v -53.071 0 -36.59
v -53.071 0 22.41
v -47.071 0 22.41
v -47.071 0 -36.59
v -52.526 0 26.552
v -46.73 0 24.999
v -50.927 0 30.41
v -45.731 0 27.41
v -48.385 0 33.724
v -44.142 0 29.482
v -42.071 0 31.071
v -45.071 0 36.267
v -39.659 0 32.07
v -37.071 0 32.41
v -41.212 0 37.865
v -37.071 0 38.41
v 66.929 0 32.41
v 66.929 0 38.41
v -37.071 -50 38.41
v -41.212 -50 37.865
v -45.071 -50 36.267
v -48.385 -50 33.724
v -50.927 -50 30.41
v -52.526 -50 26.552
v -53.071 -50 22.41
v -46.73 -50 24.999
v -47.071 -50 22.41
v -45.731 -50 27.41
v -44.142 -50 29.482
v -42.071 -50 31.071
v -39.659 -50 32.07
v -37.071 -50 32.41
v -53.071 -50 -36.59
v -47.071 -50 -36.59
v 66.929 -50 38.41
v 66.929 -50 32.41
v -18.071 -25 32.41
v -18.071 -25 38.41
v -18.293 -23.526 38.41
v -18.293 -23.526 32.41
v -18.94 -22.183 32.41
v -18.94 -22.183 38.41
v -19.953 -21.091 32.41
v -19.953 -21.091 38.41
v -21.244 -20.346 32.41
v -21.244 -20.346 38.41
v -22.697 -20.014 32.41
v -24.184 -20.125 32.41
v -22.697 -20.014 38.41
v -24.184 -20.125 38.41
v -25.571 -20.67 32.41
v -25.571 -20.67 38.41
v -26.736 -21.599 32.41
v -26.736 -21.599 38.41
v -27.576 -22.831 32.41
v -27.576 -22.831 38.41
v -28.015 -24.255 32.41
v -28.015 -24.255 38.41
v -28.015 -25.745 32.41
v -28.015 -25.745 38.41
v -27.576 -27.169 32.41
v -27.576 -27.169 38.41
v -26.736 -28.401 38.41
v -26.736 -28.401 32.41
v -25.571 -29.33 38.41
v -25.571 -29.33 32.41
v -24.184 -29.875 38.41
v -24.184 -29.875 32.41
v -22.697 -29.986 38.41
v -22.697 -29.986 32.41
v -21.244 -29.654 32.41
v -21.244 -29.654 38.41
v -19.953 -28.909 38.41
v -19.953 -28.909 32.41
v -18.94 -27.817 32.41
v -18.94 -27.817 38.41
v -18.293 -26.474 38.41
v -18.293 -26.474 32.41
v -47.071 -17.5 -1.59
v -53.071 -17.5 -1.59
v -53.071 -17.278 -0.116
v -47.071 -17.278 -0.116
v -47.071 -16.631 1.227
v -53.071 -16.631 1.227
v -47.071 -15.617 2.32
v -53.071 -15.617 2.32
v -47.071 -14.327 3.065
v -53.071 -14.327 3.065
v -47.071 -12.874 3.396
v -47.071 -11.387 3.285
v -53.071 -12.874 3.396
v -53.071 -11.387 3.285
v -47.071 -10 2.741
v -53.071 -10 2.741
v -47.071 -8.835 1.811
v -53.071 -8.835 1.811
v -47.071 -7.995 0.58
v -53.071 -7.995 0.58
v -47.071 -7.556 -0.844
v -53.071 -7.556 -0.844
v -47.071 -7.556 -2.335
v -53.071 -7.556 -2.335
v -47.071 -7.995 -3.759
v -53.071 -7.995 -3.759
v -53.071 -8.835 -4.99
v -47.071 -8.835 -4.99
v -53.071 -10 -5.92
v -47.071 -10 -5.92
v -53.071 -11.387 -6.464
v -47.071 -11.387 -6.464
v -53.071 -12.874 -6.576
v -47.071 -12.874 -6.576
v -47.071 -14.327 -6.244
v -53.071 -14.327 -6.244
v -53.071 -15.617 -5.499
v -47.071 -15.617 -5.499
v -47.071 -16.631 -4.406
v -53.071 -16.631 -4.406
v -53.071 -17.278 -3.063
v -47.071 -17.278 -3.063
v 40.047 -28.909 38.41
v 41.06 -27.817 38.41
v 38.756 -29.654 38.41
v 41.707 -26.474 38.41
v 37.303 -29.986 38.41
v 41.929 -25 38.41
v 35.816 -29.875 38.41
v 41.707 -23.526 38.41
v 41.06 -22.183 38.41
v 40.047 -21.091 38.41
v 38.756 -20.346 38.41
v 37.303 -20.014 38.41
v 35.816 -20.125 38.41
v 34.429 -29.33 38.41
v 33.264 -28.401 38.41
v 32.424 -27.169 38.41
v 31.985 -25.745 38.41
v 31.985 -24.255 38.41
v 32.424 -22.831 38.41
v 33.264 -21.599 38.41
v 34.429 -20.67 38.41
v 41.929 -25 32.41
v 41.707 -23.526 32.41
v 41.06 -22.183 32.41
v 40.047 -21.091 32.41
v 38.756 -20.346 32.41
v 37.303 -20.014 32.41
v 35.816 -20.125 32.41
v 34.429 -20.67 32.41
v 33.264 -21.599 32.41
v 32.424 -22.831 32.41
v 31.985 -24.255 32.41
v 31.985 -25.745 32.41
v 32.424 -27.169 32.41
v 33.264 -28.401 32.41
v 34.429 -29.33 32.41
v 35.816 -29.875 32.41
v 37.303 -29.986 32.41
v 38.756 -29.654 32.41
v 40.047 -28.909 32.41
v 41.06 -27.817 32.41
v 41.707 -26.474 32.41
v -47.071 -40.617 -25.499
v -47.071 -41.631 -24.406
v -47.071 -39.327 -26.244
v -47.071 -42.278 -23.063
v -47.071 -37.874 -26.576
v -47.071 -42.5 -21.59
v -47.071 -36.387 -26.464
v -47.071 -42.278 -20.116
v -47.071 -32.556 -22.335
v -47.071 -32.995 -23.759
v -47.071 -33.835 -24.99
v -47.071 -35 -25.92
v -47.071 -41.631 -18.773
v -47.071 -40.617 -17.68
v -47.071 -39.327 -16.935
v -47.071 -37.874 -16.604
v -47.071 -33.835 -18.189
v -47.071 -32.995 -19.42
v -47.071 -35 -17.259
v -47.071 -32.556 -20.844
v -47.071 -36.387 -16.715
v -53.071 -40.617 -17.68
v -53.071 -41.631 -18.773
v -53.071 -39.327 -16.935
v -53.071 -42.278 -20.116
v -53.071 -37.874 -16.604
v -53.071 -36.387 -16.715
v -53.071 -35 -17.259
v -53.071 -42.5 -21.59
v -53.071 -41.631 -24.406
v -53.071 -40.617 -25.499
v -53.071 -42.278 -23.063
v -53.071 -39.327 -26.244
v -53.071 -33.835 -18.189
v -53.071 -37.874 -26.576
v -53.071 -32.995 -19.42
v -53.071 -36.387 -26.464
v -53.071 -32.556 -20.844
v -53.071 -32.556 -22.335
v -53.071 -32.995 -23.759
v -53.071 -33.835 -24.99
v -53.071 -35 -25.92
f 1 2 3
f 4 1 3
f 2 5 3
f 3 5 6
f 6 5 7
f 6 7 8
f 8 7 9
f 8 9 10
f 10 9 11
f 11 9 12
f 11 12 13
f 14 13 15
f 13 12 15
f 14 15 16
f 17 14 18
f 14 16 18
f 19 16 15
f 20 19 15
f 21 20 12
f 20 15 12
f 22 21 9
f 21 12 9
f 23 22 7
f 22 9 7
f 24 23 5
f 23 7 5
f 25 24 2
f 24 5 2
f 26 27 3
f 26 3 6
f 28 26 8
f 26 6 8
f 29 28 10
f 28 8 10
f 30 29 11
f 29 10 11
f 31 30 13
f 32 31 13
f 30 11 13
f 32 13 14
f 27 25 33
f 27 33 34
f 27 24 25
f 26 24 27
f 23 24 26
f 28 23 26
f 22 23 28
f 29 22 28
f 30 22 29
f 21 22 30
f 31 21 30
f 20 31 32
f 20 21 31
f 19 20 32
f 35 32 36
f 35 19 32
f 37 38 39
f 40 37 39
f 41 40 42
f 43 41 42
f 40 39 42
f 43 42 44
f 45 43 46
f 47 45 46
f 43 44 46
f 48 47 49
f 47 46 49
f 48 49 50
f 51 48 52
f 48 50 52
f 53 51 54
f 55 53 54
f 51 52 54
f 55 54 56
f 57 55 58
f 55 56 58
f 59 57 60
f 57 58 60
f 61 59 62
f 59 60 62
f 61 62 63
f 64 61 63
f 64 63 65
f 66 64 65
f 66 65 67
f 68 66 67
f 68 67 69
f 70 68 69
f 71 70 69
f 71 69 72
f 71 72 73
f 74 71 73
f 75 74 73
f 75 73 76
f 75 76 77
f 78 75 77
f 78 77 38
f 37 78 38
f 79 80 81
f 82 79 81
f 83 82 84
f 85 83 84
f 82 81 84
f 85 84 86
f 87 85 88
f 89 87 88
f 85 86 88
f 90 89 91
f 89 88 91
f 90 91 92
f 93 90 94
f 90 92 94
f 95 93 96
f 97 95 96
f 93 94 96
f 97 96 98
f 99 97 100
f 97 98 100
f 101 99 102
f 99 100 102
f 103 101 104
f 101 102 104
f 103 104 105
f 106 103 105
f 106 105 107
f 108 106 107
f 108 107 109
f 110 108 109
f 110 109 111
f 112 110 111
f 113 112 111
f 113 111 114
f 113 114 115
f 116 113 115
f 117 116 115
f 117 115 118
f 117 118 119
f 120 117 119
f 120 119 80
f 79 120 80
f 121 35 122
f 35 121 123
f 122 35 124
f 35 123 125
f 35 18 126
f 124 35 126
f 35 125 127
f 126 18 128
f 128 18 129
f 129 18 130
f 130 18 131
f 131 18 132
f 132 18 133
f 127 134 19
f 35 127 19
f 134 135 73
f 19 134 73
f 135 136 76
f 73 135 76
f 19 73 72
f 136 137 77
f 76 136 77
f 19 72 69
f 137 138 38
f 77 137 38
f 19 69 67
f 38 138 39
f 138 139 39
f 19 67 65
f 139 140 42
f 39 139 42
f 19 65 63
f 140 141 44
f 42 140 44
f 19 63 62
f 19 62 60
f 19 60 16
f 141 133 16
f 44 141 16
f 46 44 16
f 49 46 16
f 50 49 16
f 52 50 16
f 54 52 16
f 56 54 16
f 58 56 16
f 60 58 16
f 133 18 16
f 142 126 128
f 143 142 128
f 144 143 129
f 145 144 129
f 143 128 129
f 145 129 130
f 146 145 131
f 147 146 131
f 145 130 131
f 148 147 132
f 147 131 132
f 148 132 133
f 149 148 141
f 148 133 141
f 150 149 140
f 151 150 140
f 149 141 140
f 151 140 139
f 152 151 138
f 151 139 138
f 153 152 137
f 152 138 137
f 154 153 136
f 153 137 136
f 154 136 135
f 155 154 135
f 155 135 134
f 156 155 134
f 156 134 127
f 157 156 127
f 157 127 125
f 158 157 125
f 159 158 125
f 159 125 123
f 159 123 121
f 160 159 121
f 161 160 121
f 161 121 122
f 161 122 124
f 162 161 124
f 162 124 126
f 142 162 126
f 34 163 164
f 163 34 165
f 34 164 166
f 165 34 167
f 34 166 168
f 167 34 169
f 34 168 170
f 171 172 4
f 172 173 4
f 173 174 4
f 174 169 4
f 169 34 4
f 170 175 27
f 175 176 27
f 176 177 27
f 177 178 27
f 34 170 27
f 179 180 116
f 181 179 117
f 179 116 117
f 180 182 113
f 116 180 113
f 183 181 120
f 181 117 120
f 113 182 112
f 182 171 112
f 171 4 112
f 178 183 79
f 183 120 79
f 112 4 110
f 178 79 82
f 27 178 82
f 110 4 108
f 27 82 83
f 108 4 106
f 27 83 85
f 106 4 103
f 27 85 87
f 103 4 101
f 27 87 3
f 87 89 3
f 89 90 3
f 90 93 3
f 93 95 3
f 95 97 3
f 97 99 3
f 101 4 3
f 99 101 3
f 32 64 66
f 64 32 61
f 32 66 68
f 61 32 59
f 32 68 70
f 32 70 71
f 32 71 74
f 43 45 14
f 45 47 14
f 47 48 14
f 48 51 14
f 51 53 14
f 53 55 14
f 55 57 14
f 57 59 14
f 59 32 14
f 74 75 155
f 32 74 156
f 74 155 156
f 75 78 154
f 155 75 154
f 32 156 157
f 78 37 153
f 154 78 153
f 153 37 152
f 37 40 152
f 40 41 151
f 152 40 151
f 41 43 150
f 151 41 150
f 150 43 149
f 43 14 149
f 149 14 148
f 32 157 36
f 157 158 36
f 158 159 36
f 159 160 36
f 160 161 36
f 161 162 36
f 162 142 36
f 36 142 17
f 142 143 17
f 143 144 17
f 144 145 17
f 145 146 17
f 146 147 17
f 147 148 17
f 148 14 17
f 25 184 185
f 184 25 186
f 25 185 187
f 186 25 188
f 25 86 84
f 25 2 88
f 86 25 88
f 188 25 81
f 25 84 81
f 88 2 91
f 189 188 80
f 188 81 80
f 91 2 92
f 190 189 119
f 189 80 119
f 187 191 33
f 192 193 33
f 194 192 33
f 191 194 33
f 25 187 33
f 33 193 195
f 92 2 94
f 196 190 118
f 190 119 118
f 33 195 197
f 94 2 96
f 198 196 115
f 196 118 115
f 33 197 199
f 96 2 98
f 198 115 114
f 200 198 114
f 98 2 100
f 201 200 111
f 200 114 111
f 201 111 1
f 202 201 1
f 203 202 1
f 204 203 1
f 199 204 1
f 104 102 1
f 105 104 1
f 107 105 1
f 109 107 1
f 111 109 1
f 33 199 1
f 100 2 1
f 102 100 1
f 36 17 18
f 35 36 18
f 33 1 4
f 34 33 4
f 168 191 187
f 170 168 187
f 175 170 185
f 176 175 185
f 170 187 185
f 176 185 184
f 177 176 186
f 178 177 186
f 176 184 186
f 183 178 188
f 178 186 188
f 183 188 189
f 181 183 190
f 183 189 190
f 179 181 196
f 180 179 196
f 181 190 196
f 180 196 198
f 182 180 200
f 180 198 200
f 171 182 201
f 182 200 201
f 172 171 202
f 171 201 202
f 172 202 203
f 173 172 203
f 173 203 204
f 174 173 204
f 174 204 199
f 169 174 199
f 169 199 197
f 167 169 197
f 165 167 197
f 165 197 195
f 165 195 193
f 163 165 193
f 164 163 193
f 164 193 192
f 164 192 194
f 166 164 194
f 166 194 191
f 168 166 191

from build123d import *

# Parameters (mm, degrees)
F1_DEPTH = 50
F2_R     = 5
F3_DEPTH = 25
F4_R     = 5
F5_DEPTH = 25


with BuildPart() as f1:
    # F0 (on Front) → F1 (new body)
    with BuildSketch(Plane.XZ):
        with BuildLine():
            Line((-53.070944, 22.410468), (-53.070944, -36.589532))
            Line((-53.070944, -36.589532), (-47.070944, -36.589532))
            Line((-47.070944, -36.589532), (-47.070944, 22.410468))
            ThreePointArc((-47.070944, 22.410468), (-44.142012, 29.481535), (-37.070944, 32.410468))
            Line((-37.070944, 32.410468), (66.929056, 32.410468))
            Line((66.929056, 32.410468), (66.929056, 38.410468))
            Line((66.929056, 38.410468), (-37.070944, 38.410468))
            ThreePointArc((-37.070944, 38.410468), (-48.384652, 33.724176), (-53.070944, 22.410468))
        make_face()
    extrude(amount=F1_DEPTH)

    # F2 (on face) → F3 (cut)
    with BuildSketch(Plane.XY.offset(38.410468)):
        with Locations((-23.070944, -25)):
            Circle(F2_R)
        with Locations((36.929056, -25)):
            Circle(F2_R)
    extrude(amount=-F3_DEPTH, mode=Mode.SUBTRACT)

    # F4 (on face) → F5 (cut)
    with BuildSketch(Plane(origin=(-53.070944, 0, 0), x_dir=(0, -1, 0), z_dir=(-1, 0, 0))):
        with Locations((12.5, -1.589532)):
            Circle(F4_R)
        with Locations((37.5, -21.589532)):
            Circle(F4_R)
    extrude(amount=-F5_DEPTH, mode=Mode.SUBTRACT)


solid = f1.part
